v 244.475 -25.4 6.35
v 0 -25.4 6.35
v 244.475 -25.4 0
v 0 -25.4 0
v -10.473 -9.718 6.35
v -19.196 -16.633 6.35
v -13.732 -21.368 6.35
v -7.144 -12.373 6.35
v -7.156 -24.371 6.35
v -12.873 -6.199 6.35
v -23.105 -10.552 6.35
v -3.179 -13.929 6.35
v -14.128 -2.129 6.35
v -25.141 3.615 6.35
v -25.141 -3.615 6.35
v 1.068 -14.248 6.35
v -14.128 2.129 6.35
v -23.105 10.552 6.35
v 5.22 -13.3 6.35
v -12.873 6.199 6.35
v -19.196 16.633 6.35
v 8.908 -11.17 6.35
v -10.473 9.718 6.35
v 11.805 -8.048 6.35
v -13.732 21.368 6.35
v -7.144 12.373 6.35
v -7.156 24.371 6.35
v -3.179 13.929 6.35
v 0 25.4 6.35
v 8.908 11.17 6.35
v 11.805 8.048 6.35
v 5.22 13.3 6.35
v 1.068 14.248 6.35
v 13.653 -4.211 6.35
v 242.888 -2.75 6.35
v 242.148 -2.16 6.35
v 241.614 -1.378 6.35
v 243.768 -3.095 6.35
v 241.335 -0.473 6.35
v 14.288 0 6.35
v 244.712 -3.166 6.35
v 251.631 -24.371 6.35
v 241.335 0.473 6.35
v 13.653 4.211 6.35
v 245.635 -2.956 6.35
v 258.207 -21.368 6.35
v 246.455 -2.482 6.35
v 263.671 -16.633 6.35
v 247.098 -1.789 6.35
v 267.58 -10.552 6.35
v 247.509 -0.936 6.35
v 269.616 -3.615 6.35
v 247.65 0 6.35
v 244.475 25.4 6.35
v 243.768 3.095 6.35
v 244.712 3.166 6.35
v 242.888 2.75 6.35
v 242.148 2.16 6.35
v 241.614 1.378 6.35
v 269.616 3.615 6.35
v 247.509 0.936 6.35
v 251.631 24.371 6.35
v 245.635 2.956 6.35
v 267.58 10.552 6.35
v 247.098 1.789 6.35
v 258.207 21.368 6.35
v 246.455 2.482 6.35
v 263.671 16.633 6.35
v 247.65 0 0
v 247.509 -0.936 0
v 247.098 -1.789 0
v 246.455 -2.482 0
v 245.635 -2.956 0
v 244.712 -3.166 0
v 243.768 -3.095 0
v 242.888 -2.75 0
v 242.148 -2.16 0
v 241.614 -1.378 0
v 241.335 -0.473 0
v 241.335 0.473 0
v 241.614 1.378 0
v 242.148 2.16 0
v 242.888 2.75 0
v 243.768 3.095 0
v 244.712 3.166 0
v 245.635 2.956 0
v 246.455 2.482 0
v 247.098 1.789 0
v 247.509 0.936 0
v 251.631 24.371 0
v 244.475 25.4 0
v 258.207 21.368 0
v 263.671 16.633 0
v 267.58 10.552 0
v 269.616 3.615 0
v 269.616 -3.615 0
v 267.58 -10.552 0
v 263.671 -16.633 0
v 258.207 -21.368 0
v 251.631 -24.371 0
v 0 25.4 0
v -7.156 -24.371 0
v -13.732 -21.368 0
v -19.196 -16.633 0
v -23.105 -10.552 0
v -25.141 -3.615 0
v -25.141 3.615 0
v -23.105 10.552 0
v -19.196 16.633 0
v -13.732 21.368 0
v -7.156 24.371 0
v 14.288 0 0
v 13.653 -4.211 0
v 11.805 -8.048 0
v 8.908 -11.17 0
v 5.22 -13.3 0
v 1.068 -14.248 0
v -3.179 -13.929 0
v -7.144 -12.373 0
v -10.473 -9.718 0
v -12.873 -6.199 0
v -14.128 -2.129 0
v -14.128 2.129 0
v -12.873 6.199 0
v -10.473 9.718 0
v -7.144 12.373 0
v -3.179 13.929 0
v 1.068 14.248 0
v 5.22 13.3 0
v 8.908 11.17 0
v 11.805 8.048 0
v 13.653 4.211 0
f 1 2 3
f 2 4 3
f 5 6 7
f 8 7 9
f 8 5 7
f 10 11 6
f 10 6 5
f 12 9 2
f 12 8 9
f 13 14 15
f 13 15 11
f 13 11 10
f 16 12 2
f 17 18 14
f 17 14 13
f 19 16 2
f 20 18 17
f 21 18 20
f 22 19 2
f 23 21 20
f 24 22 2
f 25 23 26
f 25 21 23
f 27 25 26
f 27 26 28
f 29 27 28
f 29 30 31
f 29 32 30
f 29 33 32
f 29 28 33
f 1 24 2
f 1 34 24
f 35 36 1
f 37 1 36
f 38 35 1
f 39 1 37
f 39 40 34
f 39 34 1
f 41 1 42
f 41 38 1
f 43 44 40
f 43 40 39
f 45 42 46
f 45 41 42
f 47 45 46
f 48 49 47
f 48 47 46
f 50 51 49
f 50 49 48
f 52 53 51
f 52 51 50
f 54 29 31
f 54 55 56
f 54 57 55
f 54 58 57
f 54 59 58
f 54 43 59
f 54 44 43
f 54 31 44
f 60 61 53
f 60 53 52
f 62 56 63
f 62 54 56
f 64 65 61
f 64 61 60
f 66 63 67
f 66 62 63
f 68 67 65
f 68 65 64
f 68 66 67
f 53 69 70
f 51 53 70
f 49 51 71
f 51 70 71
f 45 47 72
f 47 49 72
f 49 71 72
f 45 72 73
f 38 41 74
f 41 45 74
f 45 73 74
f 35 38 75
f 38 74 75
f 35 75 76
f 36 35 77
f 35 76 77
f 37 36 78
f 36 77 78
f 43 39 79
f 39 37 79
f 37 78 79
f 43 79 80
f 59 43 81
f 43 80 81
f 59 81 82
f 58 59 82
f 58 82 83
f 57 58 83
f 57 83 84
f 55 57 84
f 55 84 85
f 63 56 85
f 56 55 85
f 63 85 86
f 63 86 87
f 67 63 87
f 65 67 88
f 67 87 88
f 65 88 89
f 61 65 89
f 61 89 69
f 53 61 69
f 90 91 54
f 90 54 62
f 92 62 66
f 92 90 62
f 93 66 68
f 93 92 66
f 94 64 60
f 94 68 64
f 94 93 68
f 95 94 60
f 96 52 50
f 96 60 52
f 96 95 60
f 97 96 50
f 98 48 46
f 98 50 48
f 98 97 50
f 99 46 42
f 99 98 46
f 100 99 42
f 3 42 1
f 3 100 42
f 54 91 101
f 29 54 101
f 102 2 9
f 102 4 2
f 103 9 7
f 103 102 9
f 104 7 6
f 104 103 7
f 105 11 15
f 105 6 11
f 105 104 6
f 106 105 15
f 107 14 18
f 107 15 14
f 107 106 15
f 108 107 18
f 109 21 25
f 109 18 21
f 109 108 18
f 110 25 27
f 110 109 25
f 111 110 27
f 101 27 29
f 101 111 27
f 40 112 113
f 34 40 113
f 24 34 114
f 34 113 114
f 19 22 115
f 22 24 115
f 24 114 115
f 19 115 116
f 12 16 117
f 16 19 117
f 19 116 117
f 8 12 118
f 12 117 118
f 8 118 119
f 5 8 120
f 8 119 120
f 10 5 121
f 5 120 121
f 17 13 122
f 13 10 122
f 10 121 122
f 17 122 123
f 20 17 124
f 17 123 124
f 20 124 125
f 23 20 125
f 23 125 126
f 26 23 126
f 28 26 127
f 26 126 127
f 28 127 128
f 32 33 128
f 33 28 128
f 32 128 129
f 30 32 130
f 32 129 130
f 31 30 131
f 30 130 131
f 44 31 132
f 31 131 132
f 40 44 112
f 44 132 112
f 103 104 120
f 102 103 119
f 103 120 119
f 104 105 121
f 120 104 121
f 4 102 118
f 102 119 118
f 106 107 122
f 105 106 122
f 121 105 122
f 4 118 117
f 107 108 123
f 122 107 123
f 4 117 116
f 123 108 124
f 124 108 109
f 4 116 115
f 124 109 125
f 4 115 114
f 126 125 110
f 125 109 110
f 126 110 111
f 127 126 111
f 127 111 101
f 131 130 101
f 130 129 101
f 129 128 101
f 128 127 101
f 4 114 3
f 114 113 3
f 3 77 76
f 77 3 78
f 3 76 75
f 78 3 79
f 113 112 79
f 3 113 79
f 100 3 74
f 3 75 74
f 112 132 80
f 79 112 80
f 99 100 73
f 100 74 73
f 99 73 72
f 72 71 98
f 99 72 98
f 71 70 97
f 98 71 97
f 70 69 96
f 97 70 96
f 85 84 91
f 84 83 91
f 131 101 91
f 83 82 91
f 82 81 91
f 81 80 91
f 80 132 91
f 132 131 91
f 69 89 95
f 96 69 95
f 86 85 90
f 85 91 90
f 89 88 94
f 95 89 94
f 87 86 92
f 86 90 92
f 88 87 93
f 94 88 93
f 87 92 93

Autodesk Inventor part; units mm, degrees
ref_plane "YZ Plane" through (0, 0, 0) normal (1, 0, 0) x (0, 1, 0)
ref_plane "XZ Plane" through (0, 0, 0) normal (0, 1, 0) x (-1, 0, 0)
ref_plane "XY Plane" through (0, 0, 0) normal (0, 0, 1) x (1, 0, 0)
sketch "Sketch1" plane through (0, 0, 0) normal (0, 0, 1) x (1, 0, 0)
  circle A0 centre (0, 0) radius 14.2875
  circle A1 centre (244.475, 0) radius 3.175
  line L0 (0, 0) -> (244.475, 0) construction
  line L1 (0, 0) -> (244.475, 0) construction
  line L2 (0, -25.4) -> (244.475, -25.4)
  line L3 (244.475, 25.4) -> (0, 25.4)
  arc A2 (0, 25.4) -> (0, -25.4) centre (0, 0) ccw
  arc A3 (244.475, -25.4) -> (244.475, 25.4) centre (244.475, 0) ccw
  point P0 (122.2375, 0)
  dimension "d0" = 28.575
  dimension "d1" = 244.475
  dimension "d2" = 50.8
  dimension "d3" = 6.35
extrude "Extrusion1" add sketch "Sketch1" along normal blind 6.35
properties part number "GP4-004" material "Aluminum 6061"
